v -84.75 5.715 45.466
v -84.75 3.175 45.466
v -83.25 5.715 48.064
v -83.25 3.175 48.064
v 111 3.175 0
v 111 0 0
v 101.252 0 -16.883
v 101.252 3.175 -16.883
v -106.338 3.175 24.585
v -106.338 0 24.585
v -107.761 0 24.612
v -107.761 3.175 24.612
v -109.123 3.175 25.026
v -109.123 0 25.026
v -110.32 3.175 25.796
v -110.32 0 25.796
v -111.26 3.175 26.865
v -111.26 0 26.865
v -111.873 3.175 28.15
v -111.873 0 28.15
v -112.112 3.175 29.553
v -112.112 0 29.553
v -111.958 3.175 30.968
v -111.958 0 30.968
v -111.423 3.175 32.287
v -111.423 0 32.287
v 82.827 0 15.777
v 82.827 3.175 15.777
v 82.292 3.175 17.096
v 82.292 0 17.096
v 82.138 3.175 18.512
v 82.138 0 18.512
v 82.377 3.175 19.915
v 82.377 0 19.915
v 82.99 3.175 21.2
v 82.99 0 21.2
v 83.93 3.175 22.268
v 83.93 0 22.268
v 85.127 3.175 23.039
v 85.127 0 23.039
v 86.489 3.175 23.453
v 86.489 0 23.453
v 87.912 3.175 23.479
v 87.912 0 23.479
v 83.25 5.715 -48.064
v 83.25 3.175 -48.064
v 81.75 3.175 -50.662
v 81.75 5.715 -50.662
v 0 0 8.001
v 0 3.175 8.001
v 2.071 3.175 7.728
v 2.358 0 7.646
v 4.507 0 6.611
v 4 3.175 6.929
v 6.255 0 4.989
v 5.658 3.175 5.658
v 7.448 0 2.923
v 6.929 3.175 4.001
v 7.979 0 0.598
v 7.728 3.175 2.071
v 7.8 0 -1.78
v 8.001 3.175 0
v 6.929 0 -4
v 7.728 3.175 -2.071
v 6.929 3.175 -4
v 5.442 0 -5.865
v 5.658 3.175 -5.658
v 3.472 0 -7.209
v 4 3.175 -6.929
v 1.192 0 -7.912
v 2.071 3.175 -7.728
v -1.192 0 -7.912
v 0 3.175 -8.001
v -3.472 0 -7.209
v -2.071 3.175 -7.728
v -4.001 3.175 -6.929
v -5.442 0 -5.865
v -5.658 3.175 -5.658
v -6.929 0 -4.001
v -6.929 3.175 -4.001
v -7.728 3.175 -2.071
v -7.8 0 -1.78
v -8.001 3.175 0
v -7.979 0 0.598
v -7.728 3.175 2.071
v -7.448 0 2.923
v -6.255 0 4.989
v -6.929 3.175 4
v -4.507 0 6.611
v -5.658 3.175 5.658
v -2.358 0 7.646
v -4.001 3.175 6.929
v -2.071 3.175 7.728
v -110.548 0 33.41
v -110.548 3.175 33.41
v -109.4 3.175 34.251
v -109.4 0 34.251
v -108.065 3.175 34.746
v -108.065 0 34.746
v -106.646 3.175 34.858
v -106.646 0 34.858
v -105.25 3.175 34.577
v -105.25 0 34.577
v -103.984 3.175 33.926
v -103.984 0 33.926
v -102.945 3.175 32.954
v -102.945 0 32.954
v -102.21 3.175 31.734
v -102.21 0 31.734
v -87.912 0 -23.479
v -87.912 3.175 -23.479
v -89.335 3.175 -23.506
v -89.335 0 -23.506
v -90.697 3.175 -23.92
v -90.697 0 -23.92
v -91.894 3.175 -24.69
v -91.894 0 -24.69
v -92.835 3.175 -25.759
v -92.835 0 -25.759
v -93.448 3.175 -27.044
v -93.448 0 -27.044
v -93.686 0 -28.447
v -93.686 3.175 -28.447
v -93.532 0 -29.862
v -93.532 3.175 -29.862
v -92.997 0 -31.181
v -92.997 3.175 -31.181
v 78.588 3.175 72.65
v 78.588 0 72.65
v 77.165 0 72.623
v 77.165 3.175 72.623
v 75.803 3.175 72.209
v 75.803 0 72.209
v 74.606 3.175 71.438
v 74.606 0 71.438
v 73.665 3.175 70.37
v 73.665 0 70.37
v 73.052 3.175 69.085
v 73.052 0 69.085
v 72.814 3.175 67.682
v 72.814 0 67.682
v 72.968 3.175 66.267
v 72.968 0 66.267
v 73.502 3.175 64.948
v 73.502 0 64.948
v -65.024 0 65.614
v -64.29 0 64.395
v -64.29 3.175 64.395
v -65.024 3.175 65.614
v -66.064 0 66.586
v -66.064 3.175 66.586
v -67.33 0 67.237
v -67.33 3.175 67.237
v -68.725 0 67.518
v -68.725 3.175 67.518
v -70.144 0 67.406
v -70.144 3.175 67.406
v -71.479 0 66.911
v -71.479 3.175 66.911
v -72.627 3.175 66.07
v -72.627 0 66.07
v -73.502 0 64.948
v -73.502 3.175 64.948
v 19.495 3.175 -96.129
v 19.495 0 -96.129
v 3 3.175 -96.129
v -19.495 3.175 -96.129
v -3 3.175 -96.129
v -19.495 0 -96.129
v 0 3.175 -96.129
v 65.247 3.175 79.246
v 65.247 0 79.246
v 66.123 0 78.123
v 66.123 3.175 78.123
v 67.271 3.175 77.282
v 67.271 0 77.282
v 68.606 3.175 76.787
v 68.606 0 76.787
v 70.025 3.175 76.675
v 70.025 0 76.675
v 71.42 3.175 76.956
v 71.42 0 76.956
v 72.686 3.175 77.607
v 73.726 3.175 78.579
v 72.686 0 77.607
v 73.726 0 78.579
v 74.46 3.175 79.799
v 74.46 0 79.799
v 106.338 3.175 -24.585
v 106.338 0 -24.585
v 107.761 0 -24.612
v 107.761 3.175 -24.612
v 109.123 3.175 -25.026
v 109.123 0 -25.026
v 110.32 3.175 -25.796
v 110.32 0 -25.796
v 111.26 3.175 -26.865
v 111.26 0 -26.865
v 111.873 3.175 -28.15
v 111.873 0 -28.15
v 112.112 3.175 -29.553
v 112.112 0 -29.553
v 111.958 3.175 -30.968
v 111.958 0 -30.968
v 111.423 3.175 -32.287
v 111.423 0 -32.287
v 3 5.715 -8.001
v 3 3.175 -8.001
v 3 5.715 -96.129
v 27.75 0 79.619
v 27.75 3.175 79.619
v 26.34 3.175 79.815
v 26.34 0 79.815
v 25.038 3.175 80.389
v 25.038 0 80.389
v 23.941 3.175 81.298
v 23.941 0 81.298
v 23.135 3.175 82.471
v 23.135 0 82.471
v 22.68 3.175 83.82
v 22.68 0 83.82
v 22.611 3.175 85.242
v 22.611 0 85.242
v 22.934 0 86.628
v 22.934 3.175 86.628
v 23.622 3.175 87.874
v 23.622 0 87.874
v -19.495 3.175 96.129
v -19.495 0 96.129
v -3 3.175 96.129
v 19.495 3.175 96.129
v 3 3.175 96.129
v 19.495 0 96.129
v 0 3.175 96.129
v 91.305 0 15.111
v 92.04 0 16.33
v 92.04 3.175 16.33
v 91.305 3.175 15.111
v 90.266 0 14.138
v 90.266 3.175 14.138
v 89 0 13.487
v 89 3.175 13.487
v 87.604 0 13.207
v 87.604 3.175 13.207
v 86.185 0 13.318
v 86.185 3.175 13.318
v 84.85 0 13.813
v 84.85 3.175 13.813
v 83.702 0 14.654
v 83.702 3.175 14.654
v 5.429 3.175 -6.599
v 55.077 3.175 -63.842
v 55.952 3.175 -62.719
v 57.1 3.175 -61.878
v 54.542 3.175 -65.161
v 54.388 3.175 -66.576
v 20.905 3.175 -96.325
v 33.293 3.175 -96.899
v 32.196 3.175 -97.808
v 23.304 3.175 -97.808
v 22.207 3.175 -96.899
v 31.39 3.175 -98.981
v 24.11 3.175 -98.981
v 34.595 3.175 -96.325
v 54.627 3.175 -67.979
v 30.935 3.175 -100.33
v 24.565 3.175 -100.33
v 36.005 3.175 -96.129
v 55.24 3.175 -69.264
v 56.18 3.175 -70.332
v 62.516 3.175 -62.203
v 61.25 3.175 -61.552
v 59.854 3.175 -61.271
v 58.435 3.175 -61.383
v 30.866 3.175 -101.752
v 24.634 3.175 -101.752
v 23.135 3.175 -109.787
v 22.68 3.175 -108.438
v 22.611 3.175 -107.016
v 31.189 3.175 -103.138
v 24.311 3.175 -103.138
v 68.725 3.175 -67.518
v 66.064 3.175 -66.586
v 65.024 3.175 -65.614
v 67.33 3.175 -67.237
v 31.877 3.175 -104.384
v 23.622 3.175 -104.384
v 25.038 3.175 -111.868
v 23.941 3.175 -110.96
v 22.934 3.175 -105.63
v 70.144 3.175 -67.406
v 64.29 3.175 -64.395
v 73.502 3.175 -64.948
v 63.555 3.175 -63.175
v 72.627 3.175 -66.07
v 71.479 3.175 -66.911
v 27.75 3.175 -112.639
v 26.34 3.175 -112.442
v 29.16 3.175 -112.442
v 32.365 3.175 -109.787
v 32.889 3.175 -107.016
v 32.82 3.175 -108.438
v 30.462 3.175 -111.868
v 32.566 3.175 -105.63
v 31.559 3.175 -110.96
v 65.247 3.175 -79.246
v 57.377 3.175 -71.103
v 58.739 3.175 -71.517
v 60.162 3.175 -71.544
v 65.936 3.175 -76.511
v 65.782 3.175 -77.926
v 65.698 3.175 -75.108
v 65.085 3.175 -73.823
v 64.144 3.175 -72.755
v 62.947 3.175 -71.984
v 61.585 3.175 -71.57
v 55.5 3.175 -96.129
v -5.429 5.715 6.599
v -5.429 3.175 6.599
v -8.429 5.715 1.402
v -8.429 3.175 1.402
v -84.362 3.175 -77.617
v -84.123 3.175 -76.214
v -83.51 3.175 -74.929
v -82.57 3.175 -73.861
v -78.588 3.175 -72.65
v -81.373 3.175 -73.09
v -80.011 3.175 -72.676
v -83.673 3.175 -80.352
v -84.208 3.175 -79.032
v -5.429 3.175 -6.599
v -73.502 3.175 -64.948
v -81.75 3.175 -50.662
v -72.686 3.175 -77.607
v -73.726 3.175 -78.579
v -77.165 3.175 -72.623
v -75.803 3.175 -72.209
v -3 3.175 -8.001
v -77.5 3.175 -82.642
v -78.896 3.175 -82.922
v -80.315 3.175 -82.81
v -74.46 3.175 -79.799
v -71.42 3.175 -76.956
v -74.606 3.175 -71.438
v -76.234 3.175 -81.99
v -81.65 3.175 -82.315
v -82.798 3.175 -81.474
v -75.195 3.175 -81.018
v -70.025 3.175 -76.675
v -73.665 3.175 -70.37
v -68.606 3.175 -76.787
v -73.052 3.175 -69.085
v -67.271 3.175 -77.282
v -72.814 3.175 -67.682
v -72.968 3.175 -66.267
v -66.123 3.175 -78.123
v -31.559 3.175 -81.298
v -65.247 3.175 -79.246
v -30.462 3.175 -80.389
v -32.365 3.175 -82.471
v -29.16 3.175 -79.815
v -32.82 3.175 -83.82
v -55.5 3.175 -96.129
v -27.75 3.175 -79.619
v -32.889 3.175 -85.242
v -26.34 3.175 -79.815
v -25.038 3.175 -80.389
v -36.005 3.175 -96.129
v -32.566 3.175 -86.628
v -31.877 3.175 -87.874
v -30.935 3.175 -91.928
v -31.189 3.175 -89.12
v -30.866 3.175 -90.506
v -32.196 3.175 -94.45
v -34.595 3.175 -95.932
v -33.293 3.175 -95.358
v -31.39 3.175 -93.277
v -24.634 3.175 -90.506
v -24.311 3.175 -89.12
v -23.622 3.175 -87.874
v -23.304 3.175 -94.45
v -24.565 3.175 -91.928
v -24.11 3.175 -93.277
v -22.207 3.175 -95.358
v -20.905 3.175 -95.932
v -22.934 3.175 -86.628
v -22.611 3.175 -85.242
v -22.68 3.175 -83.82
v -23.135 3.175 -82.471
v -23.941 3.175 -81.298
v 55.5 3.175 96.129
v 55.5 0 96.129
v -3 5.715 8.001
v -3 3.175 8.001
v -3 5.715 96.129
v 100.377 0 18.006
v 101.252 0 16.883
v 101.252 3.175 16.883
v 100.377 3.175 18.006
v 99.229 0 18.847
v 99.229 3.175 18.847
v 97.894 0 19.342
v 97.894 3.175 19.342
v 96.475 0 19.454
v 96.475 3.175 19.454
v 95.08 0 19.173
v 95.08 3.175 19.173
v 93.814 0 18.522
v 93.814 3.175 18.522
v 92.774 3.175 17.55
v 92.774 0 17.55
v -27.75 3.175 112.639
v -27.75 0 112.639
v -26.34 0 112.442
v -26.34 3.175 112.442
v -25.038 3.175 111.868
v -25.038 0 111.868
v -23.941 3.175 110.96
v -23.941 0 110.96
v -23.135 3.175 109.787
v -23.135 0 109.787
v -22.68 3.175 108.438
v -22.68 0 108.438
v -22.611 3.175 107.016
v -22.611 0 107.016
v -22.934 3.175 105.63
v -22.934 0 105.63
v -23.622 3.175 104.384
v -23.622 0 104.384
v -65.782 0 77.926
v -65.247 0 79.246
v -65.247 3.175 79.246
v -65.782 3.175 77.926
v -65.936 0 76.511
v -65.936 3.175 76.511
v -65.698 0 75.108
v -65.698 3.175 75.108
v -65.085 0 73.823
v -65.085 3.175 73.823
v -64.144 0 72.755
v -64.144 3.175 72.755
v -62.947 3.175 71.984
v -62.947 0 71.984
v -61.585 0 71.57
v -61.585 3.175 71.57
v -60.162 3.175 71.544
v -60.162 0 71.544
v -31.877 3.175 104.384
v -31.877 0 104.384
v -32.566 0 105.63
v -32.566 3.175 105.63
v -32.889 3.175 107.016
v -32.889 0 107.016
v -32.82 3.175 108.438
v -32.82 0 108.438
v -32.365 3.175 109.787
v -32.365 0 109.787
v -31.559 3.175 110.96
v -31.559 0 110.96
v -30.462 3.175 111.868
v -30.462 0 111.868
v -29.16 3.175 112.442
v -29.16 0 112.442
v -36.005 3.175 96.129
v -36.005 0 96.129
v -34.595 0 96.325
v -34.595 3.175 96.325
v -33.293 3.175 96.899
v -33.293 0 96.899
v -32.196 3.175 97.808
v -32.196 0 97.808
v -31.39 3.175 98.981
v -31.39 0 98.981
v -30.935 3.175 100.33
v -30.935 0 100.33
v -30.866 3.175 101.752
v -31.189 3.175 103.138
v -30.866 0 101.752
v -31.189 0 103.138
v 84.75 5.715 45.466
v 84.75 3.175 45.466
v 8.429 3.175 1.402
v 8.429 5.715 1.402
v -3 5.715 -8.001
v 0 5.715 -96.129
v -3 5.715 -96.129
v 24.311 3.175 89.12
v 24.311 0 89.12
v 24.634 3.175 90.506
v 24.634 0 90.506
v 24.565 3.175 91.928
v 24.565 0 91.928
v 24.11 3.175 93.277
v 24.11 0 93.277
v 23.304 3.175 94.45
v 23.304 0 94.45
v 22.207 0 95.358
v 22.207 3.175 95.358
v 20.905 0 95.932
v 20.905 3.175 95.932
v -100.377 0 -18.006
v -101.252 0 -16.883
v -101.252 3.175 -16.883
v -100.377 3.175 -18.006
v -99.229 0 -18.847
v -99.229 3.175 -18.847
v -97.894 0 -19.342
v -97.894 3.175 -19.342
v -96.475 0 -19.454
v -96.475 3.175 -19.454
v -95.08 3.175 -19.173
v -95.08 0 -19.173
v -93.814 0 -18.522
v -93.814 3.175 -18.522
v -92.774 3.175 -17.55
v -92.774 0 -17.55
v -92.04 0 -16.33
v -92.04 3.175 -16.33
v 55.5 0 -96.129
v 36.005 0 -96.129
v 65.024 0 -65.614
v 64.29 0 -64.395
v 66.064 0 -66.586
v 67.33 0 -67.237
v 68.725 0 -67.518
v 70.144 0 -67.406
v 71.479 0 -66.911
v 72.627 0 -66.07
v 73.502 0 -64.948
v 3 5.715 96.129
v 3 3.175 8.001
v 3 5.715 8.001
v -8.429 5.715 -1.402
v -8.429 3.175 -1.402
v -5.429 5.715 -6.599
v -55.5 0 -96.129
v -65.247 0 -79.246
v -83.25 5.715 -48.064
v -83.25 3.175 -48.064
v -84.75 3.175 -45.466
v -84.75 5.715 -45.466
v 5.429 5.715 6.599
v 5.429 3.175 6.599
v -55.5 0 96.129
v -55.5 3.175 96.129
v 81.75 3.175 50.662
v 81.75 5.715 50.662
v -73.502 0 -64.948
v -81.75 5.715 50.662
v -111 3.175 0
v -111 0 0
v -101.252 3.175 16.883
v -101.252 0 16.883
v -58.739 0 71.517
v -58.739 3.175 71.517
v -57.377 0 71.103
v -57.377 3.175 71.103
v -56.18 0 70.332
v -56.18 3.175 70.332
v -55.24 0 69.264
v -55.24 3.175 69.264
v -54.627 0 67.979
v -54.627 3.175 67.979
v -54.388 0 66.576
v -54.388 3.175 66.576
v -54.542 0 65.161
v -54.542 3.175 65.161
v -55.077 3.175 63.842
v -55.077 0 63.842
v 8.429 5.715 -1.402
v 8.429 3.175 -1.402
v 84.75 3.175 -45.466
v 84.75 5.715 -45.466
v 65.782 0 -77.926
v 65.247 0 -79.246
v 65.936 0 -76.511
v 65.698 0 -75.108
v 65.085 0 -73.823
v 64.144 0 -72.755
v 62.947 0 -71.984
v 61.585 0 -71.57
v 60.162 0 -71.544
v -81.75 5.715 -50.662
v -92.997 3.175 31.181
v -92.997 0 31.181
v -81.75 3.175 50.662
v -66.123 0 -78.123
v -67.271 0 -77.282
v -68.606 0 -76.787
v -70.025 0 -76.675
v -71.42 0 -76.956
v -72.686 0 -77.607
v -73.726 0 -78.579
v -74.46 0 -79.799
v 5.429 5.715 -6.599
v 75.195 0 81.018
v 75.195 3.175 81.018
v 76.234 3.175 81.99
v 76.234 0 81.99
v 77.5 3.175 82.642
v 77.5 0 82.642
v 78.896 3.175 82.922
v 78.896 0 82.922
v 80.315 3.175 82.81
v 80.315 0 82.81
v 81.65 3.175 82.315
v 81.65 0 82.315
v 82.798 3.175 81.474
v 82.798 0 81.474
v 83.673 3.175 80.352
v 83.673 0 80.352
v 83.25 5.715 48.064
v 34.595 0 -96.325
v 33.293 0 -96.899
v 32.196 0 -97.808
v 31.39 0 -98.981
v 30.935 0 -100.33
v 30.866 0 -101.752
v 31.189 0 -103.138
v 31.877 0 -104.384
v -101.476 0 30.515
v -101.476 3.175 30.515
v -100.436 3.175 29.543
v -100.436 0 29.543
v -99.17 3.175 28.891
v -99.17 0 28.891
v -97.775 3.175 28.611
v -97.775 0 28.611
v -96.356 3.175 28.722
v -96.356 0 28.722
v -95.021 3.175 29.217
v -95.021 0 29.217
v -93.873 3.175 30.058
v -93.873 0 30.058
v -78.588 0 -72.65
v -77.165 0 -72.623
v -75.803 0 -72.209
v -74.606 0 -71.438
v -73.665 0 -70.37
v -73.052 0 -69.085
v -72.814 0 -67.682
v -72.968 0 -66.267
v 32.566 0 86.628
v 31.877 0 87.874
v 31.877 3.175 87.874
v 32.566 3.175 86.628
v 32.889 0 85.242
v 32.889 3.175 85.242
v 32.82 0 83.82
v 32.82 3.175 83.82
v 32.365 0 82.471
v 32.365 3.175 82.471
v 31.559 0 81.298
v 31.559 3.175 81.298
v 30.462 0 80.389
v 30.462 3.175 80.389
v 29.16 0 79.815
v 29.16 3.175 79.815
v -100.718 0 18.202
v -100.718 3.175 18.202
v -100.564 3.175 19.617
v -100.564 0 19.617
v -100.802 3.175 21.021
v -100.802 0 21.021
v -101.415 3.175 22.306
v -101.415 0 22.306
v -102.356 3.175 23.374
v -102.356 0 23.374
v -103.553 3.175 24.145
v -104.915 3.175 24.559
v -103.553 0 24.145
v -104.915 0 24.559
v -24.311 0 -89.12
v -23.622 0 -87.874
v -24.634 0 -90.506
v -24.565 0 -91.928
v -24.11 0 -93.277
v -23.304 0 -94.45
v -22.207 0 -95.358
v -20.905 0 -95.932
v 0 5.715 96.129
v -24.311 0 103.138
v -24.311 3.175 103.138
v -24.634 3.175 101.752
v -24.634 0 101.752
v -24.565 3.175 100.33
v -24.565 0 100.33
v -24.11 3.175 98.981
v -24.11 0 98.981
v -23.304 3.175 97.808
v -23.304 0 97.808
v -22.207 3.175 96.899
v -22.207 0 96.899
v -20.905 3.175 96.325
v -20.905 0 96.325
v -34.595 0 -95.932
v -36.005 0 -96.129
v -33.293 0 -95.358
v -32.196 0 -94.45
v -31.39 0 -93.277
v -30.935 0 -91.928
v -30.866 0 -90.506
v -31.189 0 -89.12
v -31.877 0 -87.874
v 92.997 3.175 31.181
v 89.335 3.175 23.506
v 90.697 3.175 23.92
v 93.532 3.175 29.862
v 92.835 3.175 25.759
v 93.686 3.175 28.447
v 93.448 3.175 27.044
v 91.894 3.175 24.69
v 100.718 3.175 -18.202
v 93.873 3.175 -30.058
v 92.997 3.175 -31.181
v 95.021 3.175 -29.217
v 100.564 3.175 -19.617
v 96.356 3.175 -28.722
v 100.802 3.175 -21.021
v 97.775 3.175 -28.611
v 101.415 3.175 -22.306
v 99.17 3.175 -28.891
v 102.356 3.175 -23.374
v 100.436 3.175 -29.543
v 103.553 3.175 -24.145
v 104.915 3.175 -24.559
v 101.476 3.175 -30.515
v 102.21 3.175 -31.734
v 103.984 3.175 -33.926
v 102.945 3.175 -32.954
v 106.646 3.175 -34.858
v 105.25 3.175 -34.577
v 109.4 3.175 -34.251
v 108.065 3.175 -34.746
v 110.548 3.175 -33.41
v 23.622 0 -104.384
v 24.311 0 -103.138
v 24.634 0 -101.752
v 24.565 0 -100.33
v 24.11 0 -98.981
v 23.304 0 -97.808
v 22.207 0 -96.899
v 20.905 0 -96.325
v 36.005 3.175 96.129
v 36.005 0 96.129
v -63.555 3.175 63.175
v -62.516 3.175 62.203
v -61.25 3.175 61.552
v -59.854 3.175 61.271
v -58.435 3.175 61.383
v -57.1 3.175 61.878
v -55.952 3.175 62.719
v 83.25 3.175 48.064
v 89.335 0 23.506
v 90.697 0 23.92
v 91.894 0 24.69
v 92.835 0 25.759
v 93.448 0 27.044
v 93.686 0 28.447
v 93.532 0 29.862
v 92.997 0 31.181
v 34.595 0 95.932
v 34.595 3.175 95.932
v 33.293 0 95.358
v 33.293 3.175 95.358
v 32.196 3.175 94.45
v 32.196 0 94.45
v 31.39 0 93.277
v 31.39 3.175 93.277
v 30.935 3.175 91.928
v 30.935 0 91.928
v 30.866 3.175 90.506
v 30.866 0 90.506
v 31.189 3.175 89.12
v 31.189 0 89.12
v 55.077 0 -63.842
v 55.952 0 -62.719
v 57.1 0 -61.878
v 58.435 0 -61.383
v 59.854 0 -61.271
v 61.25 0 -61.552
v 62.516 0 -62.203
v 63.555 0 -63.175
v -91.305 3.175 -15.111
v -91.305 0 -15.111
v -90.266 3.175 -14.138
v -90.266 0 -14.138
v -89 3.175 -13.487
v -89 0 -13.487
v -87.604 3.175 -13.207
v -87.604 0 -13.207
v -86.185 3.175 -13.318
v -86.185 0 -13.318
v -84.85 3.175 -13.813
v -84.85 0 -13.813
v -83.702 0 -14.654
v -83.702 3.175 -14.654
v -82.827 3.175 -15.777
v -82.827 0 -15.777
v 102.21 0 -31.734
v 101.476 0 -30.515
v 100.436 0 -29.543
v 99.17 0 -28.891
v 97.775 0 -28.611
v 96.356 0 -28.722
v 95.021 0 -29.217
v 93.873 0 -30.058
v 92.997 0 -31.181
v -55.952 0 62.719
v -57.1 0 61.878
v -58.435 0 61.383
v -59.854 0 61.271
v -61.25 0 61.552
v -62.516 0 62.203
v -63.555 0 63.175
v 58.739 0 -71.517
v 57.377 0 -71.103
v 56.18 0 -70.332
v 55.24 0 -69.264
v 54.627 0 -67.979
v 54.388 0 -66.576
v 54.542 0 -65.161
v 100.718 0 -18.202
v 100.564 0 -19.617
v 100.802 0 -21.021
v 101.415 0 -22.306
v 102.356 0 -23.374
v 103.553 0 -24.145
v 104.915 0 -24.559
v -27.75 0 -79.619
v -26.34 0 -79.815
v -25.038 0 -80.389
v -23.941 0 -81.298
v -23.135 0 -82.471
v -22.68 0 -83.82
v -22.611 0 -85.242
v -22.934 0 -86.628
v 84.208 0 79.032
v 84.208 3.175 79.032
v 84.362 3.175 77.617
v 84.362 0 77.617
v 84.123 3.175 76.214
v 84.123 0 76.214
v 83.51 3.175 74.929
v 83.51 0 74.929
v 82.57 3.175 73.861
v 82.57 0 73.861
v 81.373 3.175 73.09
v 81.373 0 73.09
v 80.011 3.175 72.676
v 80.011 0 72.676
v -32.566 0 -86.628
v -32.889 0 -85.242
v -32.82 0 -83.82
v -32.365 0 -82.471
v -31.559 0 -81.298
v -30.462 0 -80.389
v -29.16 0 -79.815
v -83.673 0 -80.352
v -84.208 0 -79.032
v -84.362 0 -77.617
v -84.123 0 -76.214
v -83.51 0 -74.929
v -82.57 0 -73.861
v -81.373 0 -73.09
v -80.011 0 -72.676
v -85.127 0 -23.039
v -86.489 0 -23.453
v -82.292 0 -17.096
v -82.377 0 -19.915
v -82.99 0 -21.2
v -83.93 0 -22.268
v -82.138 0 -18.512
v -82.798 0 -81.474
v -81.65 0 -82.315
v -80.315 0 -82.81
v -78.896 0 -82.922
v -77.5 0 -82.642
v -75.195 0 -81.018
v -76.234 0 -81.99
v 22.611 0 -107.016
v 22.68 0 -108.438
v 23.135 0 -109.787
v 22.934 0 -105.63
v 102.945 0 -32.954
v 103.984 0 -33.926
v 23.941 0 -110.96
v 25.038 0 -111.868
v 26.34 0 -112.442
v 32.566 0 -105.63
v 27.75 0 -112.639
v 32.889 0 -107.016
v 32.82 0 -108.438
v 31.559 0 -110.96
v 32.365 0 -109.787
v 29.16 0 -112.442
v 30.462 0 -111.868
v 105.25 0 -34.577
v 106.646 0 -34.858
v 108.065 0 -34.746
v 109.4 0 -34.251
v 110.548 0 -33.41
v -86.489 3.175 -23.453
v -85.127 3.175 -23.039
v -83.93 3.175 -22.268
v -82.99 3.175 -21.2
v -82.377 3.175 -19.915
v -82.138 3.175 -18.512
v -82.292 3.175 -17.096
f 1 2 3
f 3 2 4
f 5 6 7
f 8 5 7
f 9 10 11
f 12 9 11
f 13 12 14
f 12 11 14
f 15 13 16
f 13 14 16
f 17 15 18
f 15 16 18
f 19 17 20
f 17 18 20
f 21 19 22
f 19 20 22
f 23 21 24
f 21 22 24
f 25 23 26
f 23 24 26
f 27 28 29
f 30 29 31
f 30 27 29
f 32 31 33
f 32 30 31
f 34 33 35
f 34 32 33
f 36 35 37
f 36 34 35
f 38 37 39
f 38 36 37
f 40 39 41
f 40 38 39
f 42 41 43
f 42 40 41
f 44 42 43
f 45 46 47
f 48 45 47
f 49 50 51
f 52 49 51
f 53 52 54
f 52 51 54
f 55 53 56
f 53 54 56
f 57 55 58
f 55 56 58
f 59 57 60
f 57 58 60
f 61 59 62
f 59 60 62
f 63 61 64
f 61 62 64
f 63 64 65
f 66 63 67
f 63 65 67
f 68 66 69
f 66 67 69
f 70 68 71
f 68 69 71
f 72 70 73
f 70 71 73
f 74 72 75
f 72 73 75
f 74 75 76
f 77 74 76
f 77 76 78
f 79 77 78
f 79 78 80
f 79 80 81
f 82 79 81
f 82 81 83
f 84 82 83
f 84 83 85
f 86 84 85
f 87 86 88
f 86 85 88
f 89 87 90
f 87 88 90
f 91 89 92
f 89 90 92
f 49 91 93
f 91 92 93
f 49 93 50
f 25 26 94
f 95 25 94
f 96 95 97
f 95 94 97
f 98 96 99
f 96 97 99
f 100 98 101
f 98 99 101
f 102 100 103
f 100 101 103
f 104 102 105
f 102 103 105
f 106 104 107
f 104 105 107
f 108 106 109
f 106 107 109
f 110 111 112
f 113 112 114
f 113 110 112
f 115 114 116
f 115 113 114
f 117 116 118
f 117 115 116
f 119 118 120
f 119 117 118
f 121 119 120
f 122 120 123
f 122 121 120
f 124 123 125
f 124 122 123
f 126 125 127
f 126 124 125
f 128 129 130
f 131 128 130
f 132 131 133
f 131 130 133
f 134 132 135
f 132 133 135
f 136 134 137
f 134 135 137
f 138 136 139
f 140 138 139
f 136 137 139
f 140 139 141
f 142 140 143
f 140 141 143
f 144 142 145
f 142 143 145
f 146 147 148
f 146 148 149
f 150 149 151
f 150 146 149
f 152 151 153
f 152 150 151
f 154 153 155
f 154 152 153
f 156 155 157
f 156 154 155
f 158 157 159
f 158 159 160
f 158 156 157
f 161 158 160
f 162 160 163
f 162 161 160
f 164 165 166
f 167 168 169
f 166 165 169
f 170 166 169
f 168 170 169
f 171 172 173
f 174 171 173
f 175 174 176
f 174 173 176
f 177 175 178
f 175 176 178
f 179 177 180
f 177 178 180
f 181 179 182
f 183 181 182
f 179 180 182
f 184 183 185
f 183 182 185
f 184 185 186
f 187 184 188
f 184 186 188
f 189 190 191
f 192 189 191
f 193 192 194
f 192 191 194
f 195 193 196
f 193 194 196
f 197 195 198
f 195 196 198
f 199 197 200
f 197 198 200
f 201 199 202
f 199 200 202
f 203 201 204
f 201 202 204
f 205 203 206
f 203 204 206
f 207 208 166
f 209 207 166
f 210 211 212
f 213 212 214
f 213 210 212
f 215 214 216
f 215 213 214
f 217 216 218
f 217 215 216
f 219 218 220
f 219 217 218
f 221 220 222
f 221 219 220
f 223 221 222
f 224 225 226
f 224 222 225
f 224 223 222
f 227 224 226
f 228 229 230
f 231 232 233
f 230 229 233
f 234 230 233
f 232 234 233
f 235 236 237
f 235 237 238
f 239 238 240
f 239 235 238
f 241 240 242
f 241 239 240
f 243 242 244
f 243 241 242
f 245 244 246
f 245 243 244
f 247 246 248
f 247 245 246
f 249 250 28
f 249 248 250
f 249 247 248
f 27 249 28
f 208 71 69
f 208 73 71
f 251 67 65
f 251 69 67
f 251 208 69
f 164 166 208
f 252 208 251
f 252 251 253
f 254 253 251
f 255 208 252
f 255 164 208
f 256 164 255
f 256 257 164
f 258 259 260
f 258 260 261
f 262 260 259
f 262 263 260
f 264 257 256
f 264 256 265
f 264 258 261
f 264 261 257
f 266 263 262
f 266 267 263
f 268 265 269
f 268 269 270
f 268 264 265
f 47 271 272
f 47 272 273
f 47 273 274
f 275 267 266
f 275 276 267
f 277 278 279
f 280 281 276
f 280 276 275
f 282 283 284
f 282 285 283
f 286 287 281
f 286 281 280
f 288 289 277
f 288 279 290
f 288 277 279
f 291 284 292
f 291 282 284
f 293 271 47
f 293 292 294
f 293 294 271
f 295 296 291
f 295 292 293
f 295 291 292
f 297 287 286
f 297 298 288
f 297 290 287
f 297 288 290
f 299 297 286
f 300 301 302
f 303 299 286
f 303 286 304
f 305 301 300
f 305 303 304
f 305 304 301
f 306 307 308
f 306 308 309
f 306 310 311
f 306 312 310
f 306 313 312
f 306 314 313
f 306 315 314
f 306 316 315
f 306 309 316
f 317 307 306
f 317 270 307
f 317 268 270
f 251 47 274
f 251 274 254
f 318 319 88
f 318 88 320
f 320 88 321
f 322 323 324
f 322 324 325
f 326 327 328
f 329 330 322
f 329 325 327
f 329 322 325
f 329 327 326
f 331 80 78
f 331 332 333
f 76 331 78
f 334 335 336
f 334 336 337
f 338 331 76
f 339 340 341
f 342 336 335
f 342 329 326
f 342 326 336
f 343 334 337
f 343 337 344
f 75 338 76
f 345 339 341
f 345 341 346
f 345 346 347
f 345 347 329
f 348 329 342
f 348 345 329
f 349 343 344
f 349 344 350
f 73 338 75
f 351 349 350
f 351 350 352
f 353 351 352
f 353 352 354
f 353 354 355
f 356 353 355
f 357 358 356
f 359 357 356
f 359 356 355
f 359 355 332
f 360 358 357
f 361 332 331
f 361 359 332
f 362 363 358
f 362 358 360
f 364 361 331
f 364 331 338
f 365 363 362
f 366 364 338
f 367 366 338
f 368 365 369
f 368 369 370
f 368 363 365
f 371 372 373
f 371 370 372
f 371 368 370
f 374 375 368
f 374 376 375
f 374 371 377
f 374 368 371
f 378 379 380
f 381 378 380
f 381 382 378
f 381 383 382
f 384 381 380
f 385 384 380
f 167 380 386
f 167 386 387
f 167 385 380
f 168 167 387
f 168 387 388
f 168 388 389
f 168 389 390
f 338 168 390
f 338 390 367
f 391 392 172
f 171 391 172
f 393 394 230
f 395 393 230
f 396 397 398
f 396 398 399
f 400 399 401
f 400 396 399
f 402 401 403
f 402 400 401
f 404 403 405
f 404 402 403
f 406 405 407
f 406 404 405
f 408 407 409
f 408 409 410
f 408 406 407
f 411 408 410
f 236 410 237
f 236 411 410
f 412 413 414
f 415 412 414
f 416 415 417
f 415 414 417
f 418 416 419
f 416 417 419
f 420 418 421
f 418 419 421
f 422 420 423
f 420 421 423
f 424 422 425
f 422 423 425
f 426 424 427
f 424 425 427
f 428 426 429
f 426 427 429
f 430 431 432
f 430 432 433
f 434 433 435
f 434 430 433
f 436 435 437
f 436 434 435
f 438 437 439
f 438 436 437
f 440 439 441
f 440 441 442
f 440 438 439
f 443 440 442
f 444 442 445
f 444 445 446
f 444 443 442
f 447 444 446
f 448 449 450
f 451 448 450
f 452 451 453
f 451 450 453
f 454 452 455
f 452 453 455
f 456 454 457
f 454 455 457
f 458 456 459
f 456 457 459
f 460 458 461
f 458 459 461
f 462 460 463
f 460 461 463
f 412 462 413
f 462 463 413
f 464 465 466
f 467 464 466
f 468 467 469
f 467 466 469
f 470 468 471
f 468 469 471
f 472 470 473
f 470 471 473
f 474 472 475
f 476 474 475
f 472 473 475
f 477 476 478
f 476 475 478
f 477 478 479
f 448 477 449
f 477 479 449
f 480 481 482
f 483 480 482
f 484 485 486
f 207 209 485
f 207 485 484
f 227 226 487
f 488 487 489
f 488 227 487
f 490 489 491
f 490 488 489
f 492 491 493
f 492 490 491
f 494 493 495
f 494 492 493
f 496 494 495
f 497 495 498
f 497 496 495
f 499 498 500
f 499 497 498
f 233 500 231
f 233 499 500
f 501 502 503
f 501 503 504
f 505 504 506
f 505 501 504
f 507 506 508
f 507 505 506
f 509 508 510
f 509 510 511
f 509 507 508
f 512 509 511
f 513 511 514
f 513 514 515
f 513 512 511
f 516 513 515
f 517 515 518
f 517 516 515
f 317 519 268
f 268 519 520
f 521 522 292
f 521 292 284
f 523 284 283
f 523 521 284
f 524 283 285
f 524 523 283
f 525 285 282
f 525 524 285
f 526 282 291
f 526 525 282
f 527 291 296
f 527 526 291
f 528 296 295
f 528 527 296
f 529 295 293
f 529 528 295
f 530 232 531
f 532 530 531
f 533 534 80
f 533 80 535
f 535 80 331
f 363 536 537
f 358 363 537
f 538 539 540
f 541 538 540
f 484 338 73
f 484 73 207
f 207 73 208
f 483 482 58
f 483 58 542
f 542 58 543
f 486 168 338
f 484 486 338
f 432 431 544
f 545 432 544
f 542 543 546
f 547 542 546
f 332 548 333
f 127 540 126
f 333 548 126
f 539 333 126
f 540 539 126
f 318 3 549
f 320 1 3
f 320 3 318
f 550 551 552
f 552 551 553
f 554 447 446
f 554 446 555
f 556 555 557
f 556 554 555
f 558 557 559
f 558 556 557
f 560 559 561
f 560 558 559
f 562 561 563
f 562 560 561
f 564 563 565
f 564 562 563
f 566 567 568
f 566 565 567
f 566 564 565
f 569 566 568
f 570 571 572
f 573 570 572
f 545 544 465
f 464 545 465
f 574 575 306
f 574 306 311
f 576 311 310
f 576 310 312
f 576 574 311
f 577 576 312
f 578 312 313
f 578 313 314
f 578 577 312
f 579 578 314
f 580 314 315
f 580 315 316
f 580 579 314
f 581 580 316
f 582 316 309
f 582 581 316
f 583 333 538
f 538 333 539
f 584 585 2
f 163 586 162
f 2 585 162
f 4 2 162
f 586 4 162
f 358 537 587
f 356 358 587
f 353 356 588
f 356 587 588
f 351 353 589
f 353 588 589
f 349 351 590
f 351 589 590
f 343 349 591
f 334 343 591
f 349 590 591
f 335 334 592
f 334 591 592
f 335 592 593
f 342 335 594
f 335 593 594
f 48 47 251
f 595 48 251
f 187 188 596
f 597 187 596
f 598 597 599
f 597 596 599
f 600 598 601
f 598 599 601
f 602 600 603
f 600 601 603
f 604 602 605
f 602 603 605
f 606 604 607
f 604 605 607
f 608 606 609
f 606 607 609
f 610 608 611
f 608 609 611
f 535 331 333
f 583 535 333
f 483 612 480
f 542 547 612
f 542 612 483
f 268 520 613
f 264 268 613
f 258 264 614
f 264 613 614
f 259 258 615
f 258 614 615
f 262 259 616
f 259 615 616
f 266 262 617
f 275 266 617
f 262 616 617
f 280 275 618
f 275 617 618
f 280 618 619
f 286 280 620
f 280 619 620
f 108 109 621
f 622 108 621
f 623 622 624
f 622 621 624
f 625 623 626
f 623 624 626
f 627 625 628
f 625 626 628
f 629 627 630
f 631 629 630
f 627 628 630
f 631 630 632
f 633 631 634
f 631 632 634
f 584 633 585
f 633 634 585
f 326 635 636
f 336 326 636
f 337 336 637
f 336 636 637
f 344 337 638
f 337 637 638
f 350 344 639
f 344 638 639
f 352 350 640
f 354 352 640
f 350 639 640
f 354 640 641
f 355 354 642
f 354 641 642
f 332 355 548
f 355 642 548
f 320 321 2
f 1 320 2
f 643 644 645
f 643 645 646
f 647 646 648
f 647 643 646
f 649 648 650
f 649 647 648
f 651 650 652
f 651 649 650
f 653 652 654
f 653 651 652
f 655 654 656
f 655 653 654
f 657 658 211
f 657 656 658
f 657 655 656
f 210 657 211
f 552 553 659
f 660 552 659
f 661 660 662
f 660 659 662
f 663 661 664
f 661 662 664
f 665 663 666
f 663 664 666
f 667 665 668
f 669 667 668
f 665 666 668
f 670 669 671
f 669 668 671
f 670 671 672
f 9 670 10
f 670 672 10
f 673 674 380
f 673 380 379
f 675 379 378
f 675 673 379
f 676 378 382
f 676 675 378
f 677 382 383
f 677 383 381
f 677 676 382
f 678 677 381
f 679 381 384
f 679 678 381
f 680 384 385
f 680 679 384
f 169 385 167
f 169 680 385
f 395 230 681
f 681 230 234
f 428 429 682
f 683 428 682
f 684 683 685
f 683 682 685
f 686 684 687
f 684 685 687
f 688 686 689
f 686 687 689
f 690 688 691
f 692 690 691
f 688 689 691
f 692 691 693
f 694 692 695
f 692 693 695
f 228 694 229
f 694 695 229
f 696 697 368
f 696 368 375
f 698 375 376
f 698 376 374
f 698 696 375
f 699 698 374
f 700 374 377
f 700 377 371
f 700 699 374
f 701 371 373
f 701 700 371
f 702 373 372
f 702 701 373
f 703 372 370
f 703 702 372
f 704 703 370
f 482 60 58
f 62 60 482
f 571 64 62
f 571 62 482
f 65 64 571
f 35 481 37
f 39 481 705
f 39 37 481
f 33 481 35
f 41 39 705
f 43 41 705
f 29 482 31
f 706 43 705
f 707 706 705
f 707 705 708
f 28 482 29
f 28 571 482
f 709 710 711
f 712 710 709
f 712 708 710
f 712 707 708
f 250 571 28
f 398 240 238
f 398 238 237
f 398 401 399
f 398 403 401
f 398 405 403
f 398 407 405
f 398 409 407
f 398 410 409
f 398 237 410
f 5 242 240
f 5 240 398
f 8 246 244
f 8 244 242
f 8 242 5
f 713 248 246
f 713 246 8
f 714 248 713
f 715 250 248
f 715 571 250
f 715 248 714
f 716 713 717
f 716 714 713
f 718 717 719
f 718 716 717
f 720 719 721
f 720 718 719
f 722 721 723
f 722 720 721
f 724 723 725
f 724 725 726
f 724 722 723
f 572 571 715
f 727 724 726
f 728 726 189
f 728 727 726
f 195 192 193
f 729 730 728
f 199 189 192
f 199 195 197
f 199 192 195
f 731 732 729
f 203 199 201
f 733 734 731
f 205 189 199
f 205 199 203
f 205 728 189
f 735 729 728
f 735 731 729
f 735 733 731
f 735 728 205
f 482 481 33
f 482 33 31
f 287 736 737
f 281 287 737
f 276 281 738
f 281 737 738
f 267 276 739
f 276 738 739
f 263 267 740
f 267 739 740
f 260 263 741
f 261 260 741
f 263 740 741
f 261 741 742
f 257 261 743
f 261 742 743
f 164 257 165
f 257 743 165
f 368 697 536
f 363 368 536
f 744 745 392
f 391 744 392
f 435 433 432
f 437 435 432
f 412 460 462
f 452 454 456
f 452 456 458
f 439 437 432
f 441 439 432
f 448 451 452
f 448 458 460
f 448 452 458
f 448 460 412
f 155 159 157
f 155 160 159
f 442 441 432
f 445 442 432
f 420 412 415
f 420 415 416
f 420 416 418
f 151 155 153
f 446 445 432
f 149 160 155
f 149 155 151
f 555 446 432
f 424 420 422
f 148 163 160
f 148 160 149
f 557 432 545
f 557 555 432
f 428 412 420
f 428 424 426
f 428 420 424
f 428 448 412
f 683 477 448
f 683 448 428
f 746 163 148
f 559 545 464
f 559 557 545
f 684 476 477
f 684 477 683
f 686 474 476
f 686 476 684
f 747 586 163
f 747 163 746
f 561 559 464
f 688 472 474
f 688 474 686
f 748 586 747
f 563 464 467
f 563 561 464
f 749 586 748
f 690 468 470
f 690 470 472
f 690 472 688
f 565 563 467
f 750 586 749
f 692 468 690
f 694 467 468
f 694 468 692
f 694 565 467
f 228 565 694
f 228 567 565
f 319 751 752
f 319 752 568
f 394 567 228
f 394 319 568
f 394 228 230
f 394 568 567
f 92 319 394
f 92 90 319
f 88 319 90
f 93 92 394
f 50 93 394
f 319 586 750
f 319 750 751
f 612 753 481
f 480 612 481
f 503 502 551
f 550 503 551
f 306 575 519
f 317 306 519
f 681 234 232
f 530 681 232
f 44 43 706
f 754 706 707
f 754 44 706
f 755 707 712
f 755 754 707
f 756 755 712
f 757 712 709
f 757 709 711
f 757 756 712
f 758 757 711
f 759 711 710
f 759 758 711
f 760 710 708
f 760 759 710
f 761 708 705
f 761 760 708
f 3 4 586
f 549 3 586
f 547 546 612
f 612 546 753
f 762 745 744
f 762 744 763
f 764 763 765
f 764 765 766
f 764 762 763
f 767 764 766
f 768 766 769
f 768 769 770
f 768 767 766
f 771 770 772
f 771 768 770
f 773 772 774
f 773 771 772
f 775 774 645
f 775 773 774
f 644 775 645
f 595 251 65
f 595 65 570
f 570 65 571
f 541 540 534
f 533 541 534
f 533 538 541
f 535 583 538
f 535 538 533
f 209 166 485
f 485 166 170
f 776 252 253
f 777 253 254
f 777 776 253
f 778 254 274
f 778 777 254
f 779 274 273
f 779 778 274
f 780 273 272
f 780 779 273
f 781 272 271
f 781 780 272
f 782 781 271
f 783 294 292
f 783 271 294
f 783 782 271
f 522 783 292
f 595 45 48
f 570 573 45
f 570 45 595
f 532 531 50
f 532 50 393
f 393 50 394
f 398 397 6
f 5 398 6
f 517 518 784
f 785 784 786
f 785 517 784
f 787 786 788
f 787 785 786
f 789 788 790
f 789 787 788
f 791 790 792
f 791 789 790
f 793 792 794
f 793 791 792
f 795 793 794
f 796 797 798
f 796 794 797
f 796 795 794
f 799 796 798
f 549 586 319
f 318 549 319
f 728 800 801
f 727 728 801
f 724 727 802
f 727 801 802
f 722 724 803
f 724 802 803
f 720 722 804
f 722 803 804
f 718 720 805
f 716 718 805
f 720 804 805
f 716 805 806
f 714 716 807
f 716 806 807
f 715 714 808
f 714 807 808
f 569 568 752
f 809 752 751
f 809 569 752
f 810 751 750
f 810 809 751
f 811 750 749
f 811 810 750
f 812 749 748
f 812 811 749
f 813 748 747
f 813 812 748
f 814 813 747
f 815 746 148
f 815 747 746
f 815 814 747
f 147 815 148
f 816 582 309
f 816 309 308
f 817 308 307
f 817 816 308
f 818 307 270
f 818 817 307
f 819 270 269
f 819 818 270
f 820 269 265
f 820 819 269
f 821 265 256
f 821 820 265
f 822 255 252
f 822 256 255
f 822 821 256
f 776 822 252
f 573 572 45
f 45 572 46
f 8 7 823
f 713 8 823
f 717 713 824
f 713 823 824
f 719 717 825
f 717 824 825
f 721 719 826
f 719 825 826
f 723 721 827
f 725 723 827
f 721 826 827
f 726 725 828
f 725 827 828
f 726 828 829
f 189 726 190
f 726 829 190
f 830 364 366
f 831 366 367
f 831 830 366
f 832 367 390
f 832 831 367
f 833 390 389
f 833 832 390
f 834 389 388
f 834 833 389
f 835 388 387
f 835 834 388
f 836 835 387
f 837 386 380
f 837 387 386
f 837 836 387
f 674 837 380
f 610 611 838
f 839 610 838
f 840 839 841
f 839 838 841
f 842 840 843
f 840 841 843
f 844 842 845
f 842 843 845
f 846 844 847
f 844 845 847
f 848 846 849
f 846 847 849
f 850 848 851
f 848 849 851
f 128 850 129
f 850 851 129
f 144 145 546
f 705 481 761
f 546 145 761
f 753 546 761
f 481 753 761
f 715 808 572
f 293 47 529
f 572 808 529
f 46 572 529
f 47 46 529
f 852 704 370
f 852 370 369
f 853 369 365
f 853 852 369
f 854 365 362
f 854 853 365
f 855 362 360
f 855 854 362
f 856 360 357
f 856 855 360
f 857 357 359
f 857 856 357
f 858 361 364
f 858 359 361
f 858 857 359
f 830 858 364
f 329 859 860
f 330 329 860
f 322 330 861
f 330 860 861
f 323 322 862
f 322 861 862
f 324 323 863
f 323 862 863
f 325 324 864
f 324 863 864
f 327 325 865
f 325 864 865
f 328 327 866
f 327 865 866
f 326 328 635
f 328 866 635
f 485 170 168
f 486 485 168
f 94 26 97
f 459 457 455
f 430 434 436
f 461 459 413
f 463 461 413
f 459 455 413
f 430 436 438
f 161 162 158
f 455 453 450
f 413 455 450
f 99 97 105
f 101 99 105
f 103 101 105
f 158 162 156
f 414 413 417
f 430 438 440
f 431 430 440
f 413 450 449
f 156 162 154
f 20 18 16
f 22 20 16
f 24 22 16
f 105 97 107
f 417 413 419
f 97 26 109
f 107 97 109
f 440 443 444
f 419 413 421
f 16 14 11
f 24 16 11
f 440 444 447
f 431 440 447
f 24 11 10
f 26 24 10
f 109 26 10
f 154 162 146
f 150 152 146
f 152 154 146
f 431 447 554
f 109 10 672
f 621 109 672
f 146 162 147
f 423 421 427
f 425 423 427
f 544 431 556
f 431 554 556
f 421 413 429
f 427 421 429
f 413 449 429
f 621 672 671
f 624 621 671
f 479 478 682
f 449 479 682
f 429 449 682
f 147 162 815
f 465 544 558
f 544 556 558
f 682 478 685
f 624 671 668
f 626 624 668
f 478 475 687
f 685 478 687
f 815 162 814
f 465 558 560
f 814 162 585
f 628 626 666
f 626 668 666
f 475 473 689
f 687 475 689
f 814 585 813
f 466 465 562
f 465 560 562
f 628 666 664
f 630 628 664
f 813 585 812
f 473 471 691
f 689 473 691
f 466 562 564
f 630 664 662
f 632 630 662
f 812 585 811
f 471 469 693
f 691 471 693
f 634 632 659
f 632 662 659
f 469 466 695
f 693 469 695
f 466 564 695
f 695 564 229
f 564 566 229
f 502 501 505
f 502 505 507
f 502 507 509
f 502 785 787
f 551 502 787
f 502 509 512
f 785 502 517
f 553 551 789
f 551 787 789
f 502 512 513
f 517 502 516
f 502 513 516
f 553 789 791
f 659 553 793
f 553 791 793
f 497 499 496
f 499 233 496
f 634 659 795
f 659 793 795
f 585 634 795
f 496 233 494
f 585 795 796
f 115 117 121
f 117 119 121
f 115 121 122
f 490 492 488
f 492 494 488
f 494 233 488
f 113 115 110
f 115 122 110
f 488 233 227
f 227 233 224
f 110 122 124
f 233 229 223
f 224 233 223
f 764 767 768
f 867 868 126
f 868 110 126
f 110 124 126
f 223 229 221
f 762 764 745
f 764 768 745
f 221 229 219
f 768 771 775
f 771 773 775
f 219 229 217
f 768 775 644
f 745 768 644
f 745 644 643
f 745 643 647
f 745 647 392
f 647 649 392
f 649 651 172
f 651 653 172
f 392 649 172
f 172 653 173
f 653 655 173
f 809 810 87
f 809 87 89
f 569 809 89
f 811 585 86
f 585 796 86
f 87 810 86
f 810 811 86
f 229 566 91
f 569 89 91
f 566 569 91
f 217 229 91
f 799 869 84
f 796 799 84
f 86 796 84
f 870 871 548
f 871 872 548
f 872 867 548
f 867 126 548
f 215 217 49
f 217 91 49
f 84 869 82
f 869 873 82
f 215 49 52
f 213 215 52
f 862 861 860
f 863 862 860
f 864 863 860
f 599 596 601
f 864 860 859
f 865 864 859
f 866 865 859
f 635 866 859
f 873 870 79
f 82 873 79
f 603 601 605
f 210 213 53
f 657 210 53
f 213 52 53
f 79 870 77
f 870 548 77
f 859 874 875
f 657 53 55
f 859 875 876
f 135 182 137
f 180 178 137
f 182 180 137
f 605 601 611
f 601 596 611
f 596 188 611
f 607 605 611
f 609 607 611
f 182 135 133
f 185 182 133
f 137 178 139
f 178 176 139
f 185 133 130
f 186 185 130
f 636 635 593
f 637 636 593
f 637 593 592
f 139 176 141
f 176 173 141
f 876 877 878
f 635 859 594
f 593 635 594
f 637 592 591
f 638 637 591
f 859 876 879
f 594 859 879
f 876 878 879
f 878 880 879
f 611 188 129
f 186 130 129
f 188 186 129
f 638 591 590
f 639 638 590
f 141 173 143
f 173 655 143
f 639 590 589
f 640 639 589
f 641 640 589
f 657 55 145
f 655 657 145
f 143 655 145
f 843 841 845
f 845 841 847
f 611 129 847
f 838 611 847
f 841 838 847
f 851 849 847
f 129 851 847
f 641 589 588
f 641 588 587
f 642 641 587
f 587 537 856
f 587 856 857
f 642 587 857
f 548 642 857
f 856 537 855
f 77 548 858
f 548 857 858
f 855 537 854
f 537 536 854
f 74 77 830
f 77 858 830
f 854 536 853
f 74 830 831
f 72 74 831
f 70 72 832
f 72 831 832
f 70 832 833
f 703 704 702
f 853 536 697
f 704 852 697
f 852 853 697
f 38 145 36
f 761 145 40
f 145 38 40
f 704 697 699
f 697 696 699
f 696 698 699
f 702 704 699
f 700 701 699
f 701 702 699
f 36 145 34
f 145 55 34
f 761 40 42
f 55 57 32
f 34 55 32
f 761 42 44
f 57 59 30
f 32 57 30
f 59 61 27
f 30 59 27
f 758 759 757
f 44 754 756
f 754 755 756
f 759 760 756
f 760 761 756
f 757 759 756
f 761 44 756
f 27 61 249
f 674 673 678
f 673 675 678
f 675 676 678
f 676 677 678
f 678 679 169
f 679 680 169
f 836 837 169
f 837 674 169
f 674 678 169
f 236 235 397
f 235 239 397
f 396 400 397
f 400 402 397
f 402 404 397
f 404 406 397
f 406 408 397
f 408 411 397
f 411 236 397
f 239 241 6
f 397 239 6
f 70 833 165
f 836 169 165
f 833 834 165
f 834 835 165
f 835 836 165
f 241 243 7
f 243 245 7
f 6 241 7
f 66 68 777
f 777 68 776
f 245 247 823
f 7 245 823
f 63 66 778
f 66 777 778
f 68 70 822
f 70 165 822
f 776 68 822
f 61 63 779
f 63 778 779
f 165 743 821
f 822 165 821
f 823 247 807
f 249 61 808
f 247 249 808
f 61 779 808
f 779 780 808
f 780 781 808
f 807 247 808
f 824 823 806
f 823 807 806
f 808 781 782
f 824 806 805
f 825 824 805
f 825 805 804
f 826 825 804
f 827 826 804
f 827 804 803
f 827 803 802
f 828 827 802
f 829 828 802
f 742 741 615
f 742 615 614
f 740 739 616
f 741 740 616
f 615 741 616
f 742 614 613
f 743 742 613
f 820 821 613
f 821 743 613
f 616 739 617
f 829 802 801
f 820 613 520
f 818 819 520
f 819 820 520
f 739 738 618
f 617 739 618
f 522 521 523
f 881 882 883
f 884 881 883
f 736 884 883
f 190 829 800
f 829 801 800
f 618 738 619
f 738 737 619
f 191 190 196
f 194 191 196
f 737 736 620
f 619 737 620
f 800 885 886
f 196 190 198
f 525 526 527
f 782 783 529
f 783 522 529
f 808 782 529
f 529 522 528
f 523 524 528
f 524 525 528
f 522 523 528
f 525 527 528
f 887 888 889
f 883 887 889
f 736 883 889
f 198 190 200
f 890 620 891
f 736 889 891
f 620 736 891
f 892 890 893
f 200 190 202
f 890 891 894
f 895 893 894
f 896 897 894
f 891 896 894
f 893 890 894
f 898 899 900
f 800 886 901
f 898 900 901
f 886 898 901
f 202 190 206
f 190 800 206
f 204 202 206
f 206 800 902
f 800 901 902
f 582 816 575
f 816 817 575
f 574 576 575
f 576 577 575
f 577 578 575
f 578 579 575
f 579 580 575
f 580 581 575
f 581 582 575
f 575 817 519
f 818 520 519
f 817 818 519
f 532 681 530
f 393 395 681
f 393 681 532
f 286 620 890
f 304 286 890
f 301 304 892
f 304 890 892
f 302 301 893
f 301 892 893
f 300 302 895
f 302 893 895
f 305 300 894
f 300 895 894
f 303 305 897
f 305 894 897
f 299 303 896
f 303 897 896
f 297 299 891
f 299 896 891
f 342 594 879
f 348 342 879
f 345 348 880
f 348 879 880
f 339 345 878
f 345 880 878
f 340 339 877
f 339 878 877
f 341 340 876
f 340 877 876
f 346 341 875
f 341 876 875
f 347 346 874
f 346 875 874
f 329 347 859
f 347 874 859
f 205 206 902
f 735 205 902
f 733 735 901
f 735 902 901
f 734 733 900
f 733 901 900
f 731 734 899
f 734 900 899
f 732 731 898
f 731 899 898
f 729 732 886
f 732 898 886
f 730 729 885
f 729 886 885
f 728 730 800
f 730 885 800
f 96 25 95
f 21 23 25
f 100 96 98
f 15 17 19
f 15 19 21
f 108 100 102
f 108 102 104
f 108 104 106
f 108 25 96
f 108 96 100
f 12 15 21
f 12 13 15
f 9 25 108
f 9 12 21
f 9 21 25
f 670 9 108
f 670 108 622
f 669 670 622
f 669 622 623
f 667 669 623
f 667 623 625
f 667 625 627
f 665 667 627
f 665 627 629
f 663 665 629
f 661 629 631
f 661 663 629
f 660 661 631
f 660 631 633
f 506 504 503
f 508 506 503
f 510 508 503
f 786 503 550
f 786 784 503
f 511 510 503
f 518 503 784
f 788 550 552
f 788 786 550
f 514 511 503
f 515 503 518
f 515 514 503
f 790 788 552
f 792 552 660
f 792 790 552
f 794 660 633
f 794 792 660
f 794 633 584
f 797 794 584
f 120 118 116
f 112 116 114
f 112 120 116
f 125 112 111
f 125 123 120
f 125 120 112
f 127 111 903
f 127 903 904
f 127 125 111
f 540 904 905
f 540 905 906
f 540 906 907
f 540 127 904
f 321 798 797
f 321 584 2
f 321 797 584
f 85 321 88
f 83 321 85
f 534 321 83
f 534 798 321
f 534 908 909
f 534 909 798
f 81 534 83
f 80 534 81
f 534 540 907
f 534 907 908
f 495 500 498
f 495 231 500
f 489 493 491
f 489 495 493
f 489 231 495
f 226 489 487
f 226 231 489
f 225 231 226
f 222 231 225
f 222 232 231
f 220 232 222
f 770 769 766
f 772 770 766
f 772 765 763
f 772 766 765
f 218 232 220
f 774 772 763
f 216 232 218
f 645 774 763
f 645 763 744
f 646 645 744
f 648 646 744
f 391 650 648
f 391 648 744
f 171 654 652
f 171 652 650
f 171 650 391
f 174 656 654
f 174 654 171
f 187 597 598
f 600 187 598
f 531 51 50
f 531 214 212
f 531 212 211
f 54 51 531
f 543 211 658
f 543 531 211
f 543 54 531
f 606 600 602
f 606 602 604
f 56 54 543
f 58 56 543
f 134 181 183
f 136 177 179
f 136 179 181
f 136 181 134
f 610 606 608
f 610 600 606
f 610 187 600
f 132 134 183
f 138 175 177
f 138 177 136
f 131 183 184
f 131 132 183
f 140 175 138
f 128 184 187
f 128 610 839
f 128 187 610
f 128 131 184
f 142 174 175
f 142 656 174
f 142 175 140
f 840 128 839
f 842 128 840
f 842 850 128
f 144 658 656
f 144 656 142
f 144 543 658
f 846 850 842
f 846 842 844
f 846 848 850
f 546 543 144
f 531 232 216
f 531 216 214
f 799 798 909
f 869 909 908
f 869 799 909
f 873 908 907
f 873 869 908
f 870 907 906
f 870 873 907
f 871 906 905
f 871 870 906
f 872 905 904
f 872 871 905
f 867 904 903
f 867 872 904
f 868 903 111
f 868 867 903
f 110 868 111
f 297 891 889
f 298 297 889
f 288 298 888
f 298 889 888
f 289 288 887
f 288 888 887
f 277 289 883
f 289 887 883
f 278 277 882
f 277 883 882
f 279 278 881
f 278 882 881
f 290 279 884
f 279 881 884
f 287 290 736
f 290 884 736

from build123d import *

# Parameters (mm, degrees)
BOSS_EXTRUDE1_DEPTH = 3.175
BOSS_EXTRUDE2_DEPTH = 3.175
CUT_EXTRUDE2_DEPTH  = 159.172640977
CIRPATTERN1_COUNT   = 6
SKETCH4_R           = 8.001
CUT_EXTRUDE3_DEPTH  = 3.175
BOSS_EXTRUDE3_DEPTH = 2.54
CIRPATTERN2_COUNT   = 6


with BuildPart() as part:
    # Sketch1 → Boss-Extrude1 (new body)
    with BuildSketch(Plane(origin=(0, 0, 0), x_dir=(1, 0, 0), z_dir=(0, 1, 0))):
        Polygon((55.499999998, -96.128819817), (110.999999996, 0), (55.499999998, 96.128819817), (-55.499999998, 96.128819817), (-110.999999996, 0), (-55.499999998, -96.128819817), align=None)
    extrude(amount=BOSS_EXTRUDE1_DEPTH)

    # Sketch2 → Boss-Extrude2 (add)
    with BuildSketch(Plane(origin=(0, 0, 0), x_dir=(1, 0, 0), z_dir=(0, 1, 0))):
        with BuildLine():
            ThreePointArc((23.622499999, 104.383819817), (24.109685288, 98.980852172), (19.494999999, 96.128819817))
            Line((19.494999999, 96.128819817), (36.004999999, 96.128819817))
            ThreePointArc((36.004999999, 96.128819817), (31.39031471, 98.980852172), (31.877499999, 104.383819817))
            ThreePointArc((31.877499999, 104.383819817), (32.364685288, 109.786787461), (27.749999999, 112.638819817))
            ThreePointArc((27.749999999, 112.638819817), (23.13531471, 109.786787461), (23.622499999, 104.383819817))
        make_face()
    boss_extrude2 = extrude(amount=BOSS_EXTRUDE2_DEPTH)

    # Sketch2<3> → Cut-Extrude2 (cut, through all)
    with BuildSketch(Plane(origin=(0, 0, 0), x_dir=(1, 0, 0), z_dir=(0, 1, 0))):
        with BuildLine():
            Line((-19.494999999, 96.128819817), (-36.004999999, 96.128819817))
            ThreePointArc((-36.004999999, 96.128819817), (-31.39031471, 93.276787461), (-31.877499999, 87.873819817))
            ThreePointArc((-31.877499999, 87.873819817), (-32.364685288, 82.470852172), (-27.749999999, 79.618819817))
            ThreePointArc((-27.749999999, 79.618819817), (-23.13531471, 82.470852172), (-23.622499999, 87.873819817))
            ThreePointArc((-23.622499999, 87.873819817), (-24.109685288, 93.276787461), (-19.494999999, 96.128819817))
        make_face()
    cut_extrude2 = extrude(amount=CUT_EXTRUDE2_DEPTH, mode=Mode.SUBTRACT)

    # CirPattern1: Boss-Extrude2, Cut-Extrude2 ×6 about axis
    cirpattern1_axis = Axis((0, 0, 0), (0, 1, 0))
    add([boss_extrude2.rotate(cirpattern1_axis, i * 360 / CIRPATTERN1_COUNT) for i in range(1, CIRPATTERN1_COUNT)])
    add([cut_extrude2.rotate(cirpattern1_axis, i * 360 / CIRPATTERN1_COUNT) for i in range(1, CIRPATTERN1_COUNT)], mode=Mode.SUBTRACT)

    # Sketch4 → Cut-Extrude3 (cut)
    with BuildSketch(Plane(origin=(0, 3.175, 0), x_dir=(1, 0, 0), z_dir=(0, 1, 0))):
        with Locations(Location((0, 0, 0), (0, 0, 270))):
            Circle(SKETCH4_R)
    extrude(amount=-CUT_EXTRUDE3_DEPTH, mode=Mode.SUBTRACT)

    # Sketch5 → Boss-Extrude3 (add)
    with BuildSketch(Plane(origin=(0, 3.175, 0), x_dir=(1, 0, 0), z_dir=(0, 1, 0))):
        Polygon((-8.429069256, -1.402423789), (-84.749999997, -45.466333697), (-83.249999997, -48.064409908), (-6.929069256, -4.0005), align=None)
        Polygon((-6.929069256, -4.0005), (-83.249999997, -48.064409908), (-81.749999997, -50.66248612), (-5.429069256, -6.598576211), align=None)
    boss_extrude3 = extrude(amount=BOSS_EXTRUDE3_DEPTH)

    # CirPattern2: Boss-Extrude3 ×6 about axis
    cirpattern2_axis = Axis((0, 0, 0), (0, 1, 0))
    for i in range(1, CIRPATTERN2_COUNT):
        add(boss_extrude3.rotate(cirpattern2_axis, i * 360 / CIRPATTERN2_COUNT))


solid = part.part
